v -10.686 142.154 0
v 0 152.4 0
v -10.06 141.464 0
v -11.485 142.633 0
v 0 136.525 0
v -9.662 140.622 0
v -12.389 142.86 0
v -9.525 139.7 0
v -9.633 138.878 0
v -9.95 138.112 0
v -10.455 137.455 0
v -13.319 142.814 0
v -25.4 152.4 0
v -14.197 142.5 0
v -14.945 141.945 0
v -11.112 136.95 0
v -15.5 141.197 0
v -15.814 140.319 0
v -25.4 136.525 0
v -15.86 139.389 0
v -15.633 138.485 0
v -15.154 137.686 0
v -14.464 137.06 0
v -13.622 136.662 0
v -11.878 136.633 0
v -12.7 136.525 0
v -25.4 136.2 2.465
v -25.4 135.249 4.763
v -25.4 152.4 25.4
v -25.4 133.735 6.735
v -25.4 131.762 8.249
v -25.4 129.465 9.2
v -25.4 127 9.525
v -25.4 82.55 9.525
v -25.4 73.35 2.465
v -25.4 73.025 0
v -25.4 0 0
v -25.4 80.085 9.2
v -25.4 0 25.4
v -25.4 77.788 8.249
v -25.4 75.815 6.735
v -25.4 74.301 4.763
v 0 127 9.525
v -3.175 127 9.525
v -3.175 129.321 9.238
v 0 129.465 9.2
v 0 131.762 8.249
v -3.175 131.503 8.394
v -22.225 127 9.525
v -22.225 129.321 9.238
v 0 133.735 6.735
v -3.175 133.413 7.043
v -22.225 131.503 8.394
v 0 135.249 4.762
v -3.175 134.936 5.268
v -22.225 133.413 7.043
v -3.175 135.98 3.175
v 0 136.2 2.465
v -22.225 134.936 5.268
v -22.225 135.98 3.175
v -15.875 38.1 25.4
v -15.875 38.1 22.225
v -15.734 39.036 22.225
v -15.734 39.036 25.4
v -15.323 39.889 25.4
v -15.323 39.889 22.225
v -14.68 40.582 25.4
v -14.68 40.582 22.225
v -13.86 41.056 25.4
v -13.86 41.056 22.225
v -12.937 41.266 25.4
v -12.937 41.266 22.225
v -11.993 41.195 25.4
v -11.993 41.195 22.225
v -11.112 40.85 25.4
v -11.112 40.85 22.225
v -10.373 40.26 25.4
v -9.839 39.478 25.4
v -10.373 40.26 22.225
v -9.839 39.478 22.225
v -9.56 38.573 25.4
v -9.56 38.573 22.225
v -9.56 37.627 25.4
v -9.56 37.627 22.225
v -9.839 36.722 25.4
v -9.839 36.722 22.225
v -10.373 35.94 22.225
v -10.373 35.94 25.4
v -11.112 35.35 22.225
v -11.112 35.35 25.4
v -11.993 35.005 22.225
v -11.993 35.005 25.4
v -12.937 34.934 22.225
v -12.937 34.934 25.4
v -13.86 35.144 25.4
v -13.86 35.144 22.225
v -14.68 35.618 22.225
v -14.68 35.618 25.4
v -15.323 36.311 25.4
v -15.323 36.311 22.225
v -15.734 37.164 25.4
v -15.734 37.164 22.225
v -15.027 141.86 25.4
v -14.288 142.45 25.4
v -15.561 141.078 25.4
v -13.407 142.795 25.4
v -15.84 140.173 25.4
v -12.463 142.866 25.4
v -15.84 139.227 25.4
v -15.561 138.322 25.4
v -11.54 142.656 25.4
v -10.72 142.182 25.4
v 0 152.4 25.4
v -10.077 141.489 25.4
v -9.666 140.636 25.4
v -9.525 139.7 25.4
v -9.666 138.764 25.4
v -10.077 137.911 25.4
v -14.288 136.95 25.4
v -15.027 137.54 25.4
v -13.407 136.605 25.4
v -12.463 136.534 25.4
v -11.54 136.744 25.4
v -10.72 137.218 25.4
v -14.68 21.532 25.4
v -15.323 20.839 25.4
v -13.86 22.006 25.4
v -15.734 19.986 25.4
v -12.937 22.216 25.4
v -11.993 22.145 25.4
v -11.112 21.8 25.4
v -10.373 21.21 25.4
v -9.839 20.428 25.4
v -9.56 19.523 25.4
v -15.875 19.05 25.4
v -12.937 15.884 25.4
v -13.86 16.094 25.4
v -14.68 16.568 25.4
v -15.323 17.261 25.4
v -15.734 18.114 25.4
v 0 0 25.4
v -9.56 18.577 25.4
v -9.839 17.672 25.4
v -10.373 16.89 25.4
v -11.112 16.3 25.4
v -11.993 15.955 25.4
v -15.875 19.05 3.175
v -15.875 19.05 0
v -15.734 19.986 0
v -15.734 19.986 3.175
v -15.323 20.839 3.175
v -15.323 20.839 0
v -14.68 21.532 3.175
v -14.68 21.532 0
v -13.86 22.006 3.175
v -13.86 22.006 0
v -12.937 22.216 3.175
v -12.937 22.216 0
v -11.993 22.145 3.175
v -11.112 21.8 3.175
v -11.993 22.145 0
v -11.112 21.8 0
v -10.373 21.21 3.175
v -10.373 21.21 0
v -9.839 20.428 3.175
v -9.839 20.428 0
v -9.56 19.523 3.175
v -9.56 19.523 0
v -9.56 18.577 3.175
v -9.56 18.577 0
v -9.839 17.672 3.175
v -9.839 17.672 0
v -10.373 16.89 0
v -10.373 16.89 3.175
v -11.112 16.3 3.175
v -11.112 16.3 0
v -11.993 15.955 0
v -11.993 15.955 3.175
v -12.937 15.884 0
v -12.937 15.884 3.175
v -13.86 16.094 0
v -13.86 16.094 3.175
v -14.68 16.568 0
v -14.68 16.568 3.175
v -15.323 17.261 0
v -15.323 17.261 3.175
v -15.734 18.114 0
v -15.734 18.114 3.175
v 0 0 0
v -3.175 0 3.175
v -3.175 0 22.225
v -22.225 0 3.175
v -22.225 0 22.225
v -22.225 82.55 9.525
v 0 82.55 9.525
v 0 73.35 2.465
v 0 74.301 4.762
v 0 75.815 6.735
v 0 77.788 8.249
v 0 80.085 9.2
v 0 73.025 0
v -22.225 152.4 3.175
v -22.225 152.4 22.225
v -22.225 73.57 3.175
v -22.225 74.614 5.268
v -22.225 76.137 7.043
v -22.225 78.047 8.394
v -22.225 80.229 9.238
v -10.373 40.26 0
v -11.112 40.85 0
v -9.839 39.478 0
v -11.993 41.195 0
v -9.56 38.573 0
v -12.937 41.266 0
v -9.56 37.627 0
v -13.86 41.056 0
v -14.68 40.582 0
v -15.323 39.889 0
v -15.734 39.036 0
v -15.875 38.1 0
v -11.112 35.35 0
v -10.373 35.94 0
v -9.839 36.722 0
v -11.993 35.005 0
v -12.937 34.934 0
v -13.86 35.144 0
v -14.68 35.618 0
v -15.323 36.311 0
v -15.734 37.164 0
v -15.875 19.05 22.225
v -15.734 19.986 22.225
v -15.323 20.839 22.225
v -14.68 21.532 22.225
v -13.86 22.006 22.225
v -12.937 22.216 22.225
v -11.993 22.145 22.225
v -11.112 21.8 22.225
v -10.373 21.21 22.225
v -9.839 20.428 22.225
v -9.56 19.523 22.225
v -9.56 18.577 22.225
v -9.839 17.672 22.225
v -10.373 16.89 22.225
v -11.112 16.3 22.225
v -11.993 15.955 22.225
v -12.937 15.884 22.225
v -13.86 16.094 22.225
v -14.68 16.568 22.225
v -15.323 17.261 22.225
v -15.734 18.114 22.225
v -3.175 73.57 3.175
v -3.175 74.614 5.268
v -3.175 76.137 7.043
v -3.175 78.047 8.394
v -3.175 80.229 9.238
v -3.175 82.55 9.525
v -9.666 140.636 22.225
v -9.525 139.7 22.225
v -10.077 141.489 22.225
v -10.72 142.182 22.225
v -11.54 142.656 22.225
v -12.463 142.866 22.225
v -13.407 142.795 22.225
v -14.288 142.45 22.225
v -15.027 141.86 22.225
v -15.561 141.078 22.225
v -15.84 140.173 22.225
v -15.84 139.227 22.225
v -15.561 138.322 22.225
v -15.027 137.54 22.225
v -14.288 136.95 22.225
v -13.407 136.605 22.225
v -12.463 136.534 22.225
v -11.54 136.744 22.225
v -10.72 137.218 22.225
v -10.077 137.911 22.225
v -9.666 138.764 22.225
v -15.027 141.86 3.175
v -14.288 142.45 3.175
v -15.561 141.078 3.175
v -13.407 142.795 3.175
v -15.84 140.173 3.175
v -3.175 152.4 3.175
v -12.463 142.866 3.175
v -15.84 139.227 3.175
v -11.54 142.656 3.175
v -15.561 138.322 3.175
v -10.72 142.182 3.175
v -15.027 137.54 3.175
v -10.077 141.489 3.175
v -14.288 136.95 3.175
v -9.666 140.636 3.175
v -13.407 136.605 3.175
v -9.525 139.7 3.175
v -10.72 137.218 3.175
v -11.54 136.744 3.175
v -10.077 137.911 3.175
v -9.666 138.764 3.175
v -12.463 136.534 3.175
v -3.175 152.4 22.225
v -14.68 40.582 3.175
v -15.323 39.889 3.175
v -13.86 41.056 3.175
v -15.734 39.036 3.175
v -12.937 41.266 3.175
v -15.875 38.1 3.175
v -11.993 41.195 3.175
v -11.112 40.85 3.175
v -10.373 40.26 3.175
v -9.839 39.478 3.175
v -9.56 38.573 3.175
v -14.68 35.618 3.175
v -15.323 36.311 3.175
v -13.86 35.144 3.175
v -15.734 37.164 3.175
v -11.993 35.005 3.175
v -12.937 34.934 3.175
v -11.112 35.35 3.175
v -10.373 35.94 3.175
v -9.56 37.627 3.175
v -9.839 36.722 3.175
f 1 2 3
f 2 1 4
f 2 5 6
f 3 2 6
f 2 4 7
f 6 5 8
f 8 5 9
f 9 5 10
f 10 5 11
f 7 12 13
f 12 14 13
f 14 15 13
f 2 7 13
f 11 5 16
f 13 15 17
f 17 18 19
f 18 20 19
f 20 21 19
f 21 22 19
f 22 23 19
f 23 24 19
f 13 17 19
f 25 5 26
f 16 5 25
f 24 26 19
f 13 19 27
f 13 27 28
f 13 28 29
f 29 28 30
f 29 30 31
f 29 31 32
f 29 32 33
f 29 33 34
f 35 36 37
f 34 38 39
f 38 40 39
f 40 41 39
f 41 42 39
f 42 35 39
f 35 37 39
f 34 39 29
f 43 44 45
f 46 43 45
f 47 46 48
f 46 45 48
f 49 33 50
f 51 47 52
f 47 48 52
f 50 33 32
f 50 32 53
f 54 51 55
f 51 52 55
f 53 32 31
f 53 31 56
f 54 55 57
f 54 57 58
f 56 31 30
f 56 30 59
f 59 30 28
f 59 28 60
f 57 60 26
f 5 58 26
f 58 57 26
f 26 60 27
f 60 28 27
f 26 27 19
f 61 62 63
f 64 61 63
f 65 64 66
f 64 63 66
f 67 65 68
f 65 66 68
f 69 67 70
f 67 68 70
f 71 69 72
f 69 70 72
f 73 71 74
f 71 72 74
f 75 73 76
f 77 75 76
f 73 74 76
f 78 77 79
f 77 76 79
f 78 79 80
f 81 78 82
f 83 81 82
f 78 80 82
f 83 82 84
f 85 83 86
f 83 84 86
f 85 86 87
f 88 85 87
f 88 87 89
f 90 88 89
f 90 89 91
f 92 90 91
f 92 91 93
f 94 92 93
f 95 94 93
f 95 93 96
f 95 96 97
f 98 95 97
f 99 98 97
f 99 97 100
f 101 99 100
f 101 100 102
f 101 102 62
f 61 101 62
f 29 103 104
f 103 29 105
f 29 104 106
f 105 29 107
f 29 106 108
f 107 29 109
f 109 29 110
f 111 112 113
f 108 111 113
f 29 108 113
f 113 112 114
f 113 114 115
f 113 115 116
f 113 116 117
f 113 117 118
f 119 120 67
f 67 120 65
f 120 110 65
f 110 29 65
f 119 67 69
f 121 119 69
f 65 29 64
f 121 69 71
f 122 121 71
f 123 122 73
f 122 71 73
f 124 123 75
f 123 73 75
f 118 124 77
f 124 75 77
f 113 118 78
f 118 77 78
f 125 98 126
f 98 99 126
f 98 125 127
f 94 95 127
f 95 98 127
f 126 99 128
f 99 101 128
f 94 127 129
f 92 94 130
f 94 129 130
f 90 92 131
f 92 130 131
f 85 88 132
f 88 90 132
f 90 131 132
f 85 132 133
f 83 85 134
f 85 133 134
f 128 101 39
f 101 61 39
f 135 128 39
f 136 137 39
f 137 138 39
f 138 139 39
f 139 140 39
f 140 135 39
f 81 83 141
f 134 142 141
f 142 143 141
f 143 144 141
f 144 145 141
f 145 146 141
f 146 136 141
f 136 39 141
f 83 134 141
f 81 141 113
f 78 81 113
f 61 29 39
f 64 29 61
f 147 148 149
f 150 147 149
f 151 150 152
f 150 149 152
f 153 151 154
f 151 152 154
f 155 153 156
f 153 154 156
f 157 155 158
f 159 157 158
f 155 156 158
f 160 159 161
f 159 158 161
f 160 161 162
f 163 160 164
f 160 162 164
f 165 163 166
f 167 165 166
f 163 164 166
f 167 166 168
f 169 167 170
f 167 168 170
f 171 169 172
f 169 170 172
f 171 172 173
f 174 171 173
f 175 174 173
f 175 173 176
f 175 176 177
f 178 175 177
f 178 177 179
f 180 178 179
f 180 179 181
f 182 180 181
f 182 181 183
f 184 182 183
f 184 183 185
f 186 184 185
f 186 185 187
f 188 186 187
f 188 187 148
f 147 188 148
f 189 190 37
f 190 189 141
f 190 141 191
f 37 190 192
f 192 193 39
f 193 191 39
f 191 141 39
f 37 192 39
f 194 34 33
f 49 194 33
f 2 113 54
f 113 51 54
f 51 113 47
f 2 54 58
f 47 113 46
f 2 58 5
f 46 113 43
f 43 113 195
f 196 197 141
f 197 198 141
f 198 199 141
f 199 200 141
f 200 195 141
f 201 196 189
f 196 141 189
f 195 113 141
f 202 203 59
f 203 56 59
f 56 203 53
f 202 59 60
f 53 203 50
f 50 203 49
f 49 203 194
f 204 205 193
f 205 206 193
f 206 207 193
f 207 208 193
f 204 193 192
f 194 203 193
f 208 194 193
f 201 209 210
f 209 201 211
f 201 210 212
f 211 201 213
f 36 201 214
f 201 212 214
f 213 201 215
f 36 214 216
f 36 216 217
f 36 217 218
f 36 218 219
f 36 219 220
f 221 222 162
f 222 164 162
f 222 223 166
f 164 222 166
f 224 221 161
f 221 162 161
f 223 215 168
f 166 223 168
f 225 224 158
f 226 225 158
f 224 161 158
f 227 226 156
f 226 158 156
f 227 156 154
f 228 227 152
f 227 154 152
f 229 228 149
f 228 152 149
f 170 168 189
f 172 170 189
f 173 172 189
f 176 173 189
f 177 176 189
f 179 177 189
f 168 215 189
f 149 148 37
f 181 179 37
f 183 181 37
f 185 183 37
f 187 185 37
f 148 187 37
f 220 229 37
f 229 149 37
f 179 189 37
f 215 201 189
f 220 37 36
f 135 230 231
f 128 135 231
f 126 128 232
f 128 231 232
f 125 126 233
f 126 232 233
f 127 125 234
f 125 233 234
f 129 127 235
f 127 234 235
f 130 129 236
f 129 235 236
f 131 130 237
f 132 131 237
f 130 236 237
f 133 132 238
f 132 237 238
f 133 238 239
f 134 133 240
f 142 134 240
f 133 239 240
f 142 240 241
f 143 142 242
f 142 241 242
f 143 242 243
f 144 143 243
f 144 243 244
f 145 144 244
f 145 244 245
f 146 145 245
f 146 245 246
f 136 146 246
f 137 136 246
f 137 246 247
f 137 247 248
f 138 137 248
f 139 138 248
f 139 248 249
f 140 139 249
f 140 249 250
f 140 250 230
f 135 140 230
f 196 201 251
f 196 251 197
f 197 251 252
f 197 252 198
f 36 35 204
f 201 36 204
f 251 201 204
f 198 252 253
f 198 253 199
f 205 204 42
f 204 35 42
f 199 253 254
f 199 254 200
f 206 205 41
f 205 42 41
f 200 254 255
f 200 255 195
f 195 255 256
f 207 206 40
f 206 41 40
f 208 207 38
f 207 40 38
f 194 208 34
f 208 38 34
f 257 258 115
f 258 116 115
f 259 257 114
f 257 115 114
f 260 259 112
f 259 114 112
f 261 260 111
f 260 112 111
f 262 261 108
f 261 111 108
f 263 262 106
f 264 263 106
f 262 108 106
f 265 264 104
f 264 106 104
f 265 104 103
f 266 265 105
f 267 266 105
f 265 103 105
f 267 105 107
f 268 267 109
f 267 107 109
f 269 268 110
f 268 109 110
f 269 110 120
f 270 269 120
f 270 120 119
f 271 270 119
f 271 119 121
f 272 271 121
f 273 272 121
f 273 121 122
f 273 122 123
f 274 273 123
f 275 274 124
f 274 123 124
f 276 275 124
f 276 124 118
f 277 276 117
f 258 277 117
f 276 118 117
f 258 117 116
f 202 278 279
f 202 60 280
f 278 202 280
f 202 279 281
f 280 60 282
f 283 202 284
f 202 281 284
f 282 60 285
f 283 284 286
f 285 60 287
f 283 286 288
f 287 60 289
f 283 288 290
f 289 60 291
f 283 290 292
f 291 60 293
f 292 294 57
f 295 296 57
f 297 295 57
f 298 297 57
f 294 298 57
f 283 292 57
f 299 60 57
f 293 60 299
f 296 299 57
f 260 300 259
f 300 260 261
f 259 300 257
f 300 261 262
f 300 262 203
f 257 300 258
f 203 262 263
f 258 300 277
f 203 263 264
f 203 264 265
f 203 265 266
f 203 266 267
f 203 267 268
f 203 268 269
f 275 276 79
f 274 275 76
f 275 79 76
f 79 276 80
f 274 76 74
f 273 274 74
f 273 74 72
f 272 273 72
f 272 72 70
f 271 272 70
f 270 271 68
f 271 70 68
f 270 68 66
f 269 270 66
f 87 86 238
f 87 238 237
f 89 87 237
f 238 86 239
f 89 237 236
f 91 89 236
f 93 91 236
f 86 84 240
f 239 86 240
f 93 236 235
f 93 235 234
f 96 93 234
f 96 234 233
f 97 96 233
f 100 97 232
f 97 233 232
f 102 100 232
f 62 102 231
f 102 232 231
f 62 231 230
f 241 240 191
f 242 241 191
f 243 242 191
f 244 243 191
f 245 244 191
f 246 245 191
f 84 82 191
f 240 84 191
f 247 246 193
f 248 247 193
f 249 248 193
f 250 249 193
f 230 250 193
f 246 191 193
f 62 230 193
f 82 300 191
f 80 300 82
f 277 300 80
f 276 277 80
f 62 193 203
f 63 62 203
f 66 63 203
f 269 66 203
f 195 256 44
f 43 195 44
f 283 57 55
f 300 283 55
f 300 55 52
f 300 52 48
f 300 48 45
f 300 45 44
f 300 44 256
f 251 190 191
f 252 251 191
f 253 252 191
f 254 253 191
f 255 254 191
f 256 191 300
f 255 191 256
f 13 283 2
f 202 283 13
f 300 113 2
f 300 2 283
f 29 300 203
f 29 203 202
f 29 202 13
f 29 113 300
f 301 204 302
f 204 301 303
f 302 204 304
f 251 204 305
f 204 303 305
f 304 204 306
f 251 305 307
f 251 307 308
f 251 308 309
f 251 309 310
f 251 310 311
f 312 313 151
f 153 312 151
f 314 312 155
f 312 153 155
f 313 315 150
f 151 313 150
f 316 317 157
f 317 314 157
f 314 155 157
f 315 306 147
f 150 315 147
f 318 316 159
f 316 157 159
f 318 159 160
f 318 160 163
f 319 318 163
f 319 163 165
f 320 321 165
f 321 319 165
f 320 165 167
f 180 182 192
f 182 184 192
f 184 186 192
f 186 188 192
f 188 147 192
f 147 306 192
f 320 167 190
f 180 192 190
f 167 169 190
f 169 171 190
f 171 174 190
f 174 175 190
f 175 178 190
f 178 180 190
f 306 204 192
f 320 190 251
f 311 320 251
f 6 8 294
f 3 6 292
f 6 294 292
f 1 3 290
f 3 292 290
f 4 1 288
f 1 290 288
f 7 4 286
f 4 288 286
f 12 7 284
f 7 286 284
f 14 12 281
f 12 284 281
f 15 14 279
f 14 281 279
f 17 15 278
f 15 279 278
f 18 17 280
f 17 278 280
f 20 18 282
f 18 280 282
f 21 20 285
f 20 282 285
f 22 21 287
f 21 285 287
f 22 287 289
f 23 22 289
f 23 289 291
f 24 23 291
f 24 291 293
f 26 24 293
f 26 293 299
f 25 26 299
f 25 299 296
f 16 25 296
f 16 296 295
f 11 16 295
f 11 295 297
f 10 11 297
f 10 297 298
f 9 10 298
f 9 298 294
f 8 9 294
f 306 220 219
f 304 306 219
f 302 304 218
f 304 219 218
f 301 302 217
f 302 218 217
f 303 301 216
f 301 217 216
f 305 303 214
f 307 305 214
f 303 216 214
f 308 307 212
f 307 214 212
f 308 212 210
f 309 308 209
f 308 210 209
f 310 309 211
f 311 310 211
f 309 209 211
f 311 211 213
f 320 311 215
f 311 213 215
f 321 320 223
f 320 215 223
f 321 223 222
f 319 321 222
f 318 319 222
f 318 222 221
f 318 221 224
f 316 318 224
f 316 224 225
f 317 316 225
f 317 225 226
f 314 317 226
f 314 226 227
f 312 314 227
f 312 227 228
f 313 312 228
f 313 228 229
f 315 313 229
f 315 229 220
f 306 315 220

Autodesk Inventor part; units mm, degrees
ref_plane "YZ Plane" through (0, 0, 0) normal (1, 0, 0) x (0, 1, 0)
ref_plane "XZ Plane" through (0, 0, 0) normal (0, 1, 0) x (-1, 0, 0)
ref_plane "XY Plane" through (0, 0, 0) normal (0, 0, 1) x (1, 0, 0)
sketch "Sketch1" plane through (0, 0, 0) normal (0, 1, 0) x (-1, 0, 0)
  line L0 (0, 0) -> (25.4, 0)
  line L1 (25.4, 0) -> (25.4, 25.4)
  line L2 (25.4, 25.4) -> (0, 25.4)
  line L3 (0, 25.4) -> (0, 0)
  line L4 (3.175, 22.225) -> (22.225, 22.225)
  line L5 (22.225, 22.225) -> (22.225, 3.175)
  line L6 (22.225, 3.175) -> (3.175, 3.175)
  line L7 (3.175, 3.175) -> (3.175, 22.225)
  dimension "d0" = 25.4
  dimension "d1" = 25.4
  dimension "d2" = 3.175
  dimension "d3" = 3.175
  dimension "d4" = 3.175
  dimension "d5" = 3.175
extrude "Extrusion1" add sketch "Sketch1" along normal blind 152.4
sketch "Sketch2" plane through (-25.4, 0, 25.4) normal (0, 0, 1) x (1, 0, 0)
  circle A0 centre (12.7, 139.7) radius 3.175
  line L0 (0, 152.4) -> (25.4, 152.4) projected
  line L1 (0, 0) -> (0, 152.4) projected
  point P0 (25.4, 0)
  dimension "d8" = 6.35
  dimension "d9" = 12.7
  dimension "d10" = 12.7
extrude "Extrusion2" cut sketch "Sketch2" against normal blind 152.4
sketch "Sketch3" plane through (-25.4, 0, 0) normal (-1, 0, 0) x (0, 0, 1)
  line L0 (0, 0) -> (0, 152.4) projected
  line L1 (0, 127) -> (0, 82.55) construction
  line L2 (-9.525, 127) -> (-9.525, 82.55)
  line L3 (9.525, 82.55) -> (9.525, 127)
  arc A0 (9.525, 127) -> (-9.525, 127) centre (0, 127) ccw
  arc A1 (-9.525, 82.55) -> (9.525, 82.55) centre (0, 82.55) ccw
  line L4 (0, 152.4) -> (25.4, 152.4) projected
  line L5 (0, 0) -> (25.4, 0) projected
  point P0 (0, 104.775)
  dimension "d13" = 44.45
  dimension "d14" = 19.05
  dimension "d15" = 25.4
  dimension "d16" = 82.55
extrude "Extrusion3" cut sketch "Sketch3" against normal blind 25.4
sketch "Sketch4" plane through (0, 0, 0) normal (0, 0, -1) x (-1, 0, 0)
  line L0 (0, 0) -> (25.4, 0) projected
  line L1 (25.4, 0) -> (25.4, 73.025) projected
  circle A0 centre (12.7, 38.1) radius 3.175
  circle A1 centre (12.7, 19.05) radius 3.175
  dimension "d19" = 19.05
  dimension "d20" = 12.7
  dimension "d21" = 12.7
  dimension "d22" = 19.05
  dimension "d23" = 6.35
  dimension "d24" = 6.35
extrude "Extrusion4" cut sketch "Sketch4" against normal blind 25.4
equation "\"d4\" = d2"
equation "\"d5\" = d3"
properties part number "6x1x1x0125 tube" material "Aluminum 6061"
